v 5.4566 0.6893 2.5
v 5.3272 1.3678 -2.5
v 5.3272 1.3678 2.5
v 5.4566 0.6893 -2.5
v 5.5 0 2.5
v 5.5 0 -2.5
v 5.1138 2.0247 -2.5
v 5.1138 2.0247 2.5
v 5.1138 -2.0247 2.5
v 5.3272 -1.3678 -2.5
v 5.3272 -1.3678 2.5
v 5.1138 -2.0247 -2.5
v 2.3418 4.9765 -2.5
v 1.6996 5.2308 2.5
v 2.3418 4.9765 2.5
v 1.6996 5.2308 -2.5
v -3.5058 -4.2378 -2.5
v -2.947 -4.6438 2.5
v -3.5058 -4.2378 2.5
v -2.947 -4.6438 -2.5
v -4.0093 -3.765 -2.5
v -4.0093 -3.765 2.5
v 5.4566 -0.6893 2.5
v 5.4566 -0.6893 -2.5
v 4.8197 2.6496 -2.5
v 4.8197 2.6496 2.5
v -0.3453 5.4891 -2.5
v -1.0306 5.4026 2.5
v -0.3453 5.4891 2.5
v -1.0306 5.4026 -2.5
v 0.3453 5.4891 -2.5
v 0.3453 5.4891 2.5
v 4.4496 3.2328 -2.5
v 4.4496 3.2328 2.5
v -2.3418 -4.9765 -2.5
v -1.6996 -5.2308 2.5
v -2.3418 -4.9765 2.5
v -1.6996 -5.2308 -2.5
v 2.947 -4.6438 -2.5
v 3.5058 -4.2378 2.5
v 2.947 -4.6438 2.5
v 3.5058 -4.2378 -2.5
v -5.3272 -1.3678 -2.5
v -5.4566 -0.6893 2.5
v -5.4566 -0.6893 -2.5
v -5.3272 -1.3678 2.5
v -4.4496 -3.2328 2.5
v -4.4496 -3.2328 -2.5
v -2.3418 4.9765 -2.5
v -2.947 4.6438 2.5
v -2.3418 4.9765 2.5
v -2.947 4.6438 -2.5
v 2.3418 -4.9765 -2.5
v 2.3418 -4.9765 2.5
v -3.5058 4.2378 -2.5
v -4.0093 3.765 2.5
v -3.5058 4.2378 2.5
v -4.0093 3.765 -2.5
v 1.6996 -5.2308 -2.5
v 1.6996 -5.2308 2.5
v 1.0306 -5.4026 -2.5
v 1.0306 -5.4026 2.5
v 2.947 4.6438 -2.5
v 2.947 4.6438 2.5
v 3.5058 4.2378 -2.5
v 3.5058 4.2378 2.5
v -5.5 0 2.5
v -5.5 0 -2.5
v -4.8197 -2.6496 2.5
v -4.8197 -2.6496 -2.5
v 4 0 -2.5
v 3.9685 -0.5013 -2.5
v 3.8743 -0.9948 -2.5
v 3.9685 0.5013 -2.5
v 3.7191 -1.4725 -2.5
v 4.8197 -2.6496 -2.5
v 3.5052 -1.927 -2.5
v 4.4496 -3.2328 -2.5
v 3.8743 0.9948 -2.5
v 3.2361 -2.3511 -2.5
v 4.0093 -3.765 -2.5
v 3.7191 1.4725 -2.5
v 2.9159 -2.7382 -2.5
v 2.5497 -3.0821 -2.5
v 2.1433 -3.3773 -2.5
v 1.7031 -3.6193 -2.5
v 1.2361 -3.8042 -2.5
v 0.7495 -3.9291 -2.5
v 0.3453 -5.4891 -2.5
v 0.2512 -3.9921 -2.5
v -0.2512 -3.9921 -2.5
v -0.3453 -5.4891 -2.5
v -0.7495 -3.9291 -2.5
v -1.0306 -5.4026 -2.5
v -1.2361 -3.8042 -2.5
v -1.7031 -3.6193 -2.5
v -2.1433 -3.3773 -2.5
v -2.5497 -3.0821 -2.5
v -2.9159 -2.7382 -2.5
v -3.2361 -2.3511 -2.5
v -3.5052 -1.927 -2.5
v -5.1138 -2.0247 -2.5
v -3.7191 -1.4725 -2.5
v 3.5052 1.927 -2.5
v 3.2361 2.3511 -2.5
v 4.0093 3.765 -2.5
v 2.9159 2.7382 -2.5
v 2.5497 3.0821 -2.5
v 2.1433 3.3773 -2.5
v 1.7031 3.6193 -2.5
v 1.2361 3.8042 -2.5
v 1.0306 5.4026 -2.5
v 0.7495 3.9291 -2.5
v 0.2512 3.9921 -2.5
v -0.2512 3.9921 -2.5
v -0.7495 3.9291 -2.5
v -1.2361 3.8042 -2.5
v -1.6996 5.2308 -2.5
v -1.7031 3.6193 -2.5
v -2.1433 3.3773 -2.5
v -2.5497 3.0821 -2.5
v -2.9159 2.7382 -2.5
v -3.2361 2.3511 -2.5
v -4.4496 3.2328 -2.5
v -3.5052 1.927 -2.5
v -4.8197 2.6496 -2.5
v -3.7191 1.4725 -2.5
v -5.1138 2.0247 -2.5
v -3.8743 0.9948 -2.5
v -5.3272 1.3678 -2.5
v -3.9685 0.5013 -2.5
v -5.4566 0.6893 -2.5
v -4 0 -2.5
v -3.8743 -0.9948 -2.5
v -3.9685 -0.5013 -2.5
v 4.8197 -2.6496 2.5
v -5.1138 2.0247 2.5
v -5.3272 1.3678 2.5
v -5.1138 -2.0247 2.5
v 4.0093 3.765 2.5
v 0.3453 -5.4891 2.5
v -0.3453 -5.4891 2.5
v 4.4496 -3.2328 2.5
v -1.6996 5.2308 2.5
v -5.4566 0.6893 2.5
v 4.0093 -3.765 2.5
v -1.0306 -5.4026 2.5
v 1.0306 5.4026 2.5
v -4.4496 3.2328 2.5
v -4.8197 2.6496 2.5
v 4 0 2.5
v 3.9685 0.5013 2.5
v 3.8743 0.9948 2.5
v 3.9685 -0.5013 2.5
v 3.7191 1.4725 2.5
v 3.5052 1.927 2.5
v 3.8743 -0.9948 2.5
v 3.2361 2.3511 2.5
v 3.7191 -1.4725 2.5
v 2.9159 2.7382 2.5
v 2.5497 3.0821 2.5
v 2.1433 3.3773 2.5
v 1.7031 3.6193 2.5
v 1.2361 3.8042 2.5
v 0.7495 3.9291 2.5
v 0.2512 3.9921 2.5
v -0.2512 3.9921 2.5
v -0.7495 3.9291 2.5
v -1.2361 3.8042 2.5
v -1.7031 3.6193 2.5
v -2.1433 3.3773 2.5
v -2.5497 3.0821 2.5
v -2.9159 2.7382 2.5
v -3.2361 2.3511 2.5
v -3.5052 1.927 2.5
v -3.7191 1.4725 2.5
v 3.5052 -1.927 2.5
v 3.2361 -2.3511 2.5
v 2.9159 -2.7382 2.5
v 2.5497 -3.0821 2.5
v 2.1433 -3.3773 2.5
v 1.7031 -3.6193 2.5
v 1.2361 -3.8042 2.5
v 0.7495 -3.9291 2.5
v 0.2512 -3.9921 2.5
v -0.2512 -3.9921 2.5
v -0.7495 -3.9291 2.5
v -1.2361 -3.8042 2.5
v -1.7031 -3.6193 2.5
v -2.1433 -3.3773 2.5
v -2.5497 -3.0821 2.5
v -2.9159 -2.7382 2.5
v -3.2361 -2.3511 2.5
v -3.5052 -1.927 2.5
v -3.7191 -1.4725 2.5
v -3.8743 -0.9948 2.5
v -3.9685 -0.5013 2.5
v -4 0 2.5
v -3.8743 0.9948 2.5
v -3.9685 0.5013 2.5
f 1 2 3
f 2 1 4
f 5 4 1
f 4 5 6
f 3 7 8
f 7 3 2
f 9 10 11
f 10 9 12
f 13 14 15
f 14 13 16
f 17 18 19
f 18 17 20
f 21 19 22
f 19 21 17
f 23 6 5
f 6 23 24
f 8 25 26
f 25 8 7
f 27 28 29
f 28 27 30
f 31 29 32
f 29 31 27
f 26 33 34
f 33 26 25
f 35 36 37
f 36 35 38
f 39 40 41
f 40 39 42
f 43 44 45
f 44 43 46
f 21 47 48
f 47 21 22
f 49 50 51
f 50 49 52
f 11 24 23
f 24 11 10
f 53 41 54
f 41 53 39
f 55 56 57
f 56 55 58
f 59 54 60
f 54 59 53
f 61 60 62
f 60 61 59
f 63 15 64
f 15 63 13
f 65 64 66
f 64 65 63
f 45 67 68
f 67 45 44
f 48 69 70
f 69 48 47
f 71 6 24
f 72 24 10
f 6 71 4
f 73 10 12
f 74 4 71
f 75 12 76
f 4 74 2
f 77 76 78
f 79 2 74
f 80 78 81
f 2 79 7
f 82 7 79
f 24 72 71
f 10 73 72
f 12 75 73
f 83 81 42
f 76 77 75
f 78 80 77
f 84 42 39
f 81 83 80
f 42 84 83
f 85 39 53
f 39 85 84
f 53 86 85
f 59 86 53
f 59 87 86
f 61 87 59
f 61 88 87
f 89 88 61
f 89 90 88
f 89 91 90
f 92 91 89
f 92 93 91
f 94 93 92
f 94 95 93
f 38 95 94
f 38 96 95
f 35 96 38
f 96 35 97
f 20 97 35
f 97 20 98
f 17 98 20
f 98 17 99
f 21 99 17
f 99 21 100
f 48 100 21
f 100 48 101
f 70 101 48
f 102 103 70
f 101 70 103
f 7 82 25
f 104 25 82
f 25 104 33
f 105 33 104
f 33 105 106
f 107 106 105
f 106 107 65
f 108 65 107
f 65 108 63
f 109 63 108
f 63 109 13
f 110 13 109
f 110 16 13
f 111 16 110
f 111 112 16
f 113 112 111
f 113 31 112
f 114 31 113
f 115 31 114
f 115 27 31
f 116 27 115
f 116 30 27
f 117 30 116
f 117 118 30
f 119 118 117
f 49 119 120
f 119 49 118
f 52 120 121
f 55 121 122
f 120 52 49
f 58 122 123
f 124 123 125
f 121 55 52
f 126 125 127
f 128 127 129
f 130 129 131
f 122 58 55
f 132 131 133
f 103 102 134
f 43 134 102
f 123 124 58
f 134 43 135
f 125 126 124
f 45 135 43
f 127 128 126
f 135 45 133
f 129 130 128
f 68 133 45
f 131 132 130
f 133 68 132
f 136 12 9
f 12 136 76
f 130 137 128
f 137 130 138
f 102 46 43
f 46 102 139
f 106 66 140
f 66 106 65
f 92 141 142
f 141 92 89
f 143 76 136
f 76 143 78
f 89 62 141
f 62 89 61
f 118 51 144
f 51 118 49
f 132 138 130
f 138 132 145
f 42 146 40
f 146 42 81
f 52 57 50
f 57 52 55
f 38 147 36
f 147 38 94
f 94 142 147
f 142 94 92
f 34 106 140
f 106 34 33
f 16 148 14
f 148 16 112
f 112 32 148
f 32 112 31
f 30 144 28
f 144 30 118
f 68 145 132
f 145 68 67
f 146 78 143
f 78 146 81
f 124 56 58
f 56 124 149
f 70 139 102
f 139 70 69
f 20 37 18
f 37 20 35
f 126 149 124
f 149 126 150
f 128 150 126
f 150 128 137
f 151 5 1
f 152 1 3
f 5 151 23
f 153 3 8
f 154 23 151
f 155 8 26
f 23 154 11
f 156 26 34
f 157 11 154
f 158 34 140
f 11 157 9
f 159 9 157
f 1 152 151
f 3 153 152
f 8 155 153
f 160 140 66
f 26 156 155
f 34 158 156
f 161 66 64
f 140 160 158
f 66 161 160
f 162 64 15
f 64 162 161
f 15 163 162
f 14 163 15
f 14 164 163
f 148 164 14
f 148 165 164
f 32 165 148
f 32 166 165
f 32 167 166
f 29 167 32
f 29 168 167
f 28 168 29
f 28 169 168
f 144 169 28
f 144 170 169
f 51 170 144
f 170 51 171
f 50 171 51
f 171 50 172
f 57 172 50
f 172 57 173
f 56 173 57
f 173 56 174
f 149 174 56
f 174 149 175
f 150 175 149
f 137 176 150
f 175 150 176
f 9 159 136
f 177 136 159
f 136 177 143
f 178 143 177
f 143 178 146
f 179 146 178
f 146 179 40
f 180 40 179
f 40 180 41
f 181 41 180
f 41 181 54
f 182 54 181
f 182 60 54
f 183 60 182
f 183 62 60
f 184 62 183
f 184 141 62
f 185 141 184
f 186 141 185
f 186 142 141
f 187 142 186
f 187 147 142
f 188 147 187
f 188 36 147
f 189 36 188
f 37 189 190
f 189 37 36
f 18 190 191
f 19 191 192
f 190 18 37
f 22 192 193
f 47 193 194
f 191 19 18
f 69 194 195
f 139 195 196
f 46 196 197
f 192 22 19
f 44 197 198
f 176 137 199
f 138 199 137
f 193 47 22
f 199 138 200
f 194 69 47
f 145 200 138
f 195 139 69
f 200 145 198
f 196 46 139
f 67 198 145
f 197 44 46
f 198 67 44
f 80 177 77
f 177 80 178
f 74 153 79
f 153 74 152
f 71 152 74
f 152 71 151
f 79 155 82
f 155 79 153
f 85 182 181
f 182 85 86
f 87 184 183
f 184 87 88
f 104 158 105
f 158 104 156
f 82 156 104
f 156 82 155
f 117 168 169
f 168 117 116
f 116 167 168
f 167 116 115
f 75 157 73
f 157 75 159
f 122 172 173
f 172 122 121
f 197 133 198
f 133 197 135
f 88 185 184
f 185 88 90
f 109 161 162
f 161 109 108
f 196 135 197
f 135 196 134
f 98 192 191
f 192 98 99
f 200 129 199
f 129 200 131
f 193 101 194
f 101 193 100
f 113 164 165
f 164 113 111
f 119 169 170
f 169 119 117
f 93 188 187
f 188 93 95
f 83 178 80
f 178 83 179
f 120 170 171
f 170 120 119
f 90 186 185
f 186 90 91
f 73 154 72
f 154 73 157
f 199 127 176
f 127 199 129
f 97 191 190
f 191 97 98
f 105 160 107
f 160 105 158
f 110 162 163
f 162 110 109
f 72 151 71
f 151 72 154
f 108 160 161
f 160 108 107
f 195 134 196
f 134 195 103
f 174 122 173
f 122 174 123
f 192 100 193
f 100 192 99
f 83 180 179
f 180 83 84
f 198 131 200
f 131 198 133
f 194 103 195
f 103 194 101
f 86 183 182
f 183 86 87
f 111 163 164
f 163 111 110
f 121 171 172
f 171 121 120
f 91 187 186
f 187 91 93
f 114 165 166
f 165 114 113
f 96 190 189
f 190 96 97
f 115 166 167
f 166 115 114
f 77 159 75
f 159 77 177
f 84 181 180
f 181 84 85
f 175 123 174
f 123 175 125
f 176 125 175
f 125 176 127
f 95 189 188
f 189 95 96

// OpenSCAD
$fn = 50;


difference() {
	union() {
		translate(v = [0, 0, -2.5000000000]) {
			cylinder(h = 5, r = 5.5000000000);
		}
	}
	union() {
		translate(v = [0, 0, -100.0000000000]) {
			cylinder(h = 200, r = 4.0000000000);
		}
	}
}
